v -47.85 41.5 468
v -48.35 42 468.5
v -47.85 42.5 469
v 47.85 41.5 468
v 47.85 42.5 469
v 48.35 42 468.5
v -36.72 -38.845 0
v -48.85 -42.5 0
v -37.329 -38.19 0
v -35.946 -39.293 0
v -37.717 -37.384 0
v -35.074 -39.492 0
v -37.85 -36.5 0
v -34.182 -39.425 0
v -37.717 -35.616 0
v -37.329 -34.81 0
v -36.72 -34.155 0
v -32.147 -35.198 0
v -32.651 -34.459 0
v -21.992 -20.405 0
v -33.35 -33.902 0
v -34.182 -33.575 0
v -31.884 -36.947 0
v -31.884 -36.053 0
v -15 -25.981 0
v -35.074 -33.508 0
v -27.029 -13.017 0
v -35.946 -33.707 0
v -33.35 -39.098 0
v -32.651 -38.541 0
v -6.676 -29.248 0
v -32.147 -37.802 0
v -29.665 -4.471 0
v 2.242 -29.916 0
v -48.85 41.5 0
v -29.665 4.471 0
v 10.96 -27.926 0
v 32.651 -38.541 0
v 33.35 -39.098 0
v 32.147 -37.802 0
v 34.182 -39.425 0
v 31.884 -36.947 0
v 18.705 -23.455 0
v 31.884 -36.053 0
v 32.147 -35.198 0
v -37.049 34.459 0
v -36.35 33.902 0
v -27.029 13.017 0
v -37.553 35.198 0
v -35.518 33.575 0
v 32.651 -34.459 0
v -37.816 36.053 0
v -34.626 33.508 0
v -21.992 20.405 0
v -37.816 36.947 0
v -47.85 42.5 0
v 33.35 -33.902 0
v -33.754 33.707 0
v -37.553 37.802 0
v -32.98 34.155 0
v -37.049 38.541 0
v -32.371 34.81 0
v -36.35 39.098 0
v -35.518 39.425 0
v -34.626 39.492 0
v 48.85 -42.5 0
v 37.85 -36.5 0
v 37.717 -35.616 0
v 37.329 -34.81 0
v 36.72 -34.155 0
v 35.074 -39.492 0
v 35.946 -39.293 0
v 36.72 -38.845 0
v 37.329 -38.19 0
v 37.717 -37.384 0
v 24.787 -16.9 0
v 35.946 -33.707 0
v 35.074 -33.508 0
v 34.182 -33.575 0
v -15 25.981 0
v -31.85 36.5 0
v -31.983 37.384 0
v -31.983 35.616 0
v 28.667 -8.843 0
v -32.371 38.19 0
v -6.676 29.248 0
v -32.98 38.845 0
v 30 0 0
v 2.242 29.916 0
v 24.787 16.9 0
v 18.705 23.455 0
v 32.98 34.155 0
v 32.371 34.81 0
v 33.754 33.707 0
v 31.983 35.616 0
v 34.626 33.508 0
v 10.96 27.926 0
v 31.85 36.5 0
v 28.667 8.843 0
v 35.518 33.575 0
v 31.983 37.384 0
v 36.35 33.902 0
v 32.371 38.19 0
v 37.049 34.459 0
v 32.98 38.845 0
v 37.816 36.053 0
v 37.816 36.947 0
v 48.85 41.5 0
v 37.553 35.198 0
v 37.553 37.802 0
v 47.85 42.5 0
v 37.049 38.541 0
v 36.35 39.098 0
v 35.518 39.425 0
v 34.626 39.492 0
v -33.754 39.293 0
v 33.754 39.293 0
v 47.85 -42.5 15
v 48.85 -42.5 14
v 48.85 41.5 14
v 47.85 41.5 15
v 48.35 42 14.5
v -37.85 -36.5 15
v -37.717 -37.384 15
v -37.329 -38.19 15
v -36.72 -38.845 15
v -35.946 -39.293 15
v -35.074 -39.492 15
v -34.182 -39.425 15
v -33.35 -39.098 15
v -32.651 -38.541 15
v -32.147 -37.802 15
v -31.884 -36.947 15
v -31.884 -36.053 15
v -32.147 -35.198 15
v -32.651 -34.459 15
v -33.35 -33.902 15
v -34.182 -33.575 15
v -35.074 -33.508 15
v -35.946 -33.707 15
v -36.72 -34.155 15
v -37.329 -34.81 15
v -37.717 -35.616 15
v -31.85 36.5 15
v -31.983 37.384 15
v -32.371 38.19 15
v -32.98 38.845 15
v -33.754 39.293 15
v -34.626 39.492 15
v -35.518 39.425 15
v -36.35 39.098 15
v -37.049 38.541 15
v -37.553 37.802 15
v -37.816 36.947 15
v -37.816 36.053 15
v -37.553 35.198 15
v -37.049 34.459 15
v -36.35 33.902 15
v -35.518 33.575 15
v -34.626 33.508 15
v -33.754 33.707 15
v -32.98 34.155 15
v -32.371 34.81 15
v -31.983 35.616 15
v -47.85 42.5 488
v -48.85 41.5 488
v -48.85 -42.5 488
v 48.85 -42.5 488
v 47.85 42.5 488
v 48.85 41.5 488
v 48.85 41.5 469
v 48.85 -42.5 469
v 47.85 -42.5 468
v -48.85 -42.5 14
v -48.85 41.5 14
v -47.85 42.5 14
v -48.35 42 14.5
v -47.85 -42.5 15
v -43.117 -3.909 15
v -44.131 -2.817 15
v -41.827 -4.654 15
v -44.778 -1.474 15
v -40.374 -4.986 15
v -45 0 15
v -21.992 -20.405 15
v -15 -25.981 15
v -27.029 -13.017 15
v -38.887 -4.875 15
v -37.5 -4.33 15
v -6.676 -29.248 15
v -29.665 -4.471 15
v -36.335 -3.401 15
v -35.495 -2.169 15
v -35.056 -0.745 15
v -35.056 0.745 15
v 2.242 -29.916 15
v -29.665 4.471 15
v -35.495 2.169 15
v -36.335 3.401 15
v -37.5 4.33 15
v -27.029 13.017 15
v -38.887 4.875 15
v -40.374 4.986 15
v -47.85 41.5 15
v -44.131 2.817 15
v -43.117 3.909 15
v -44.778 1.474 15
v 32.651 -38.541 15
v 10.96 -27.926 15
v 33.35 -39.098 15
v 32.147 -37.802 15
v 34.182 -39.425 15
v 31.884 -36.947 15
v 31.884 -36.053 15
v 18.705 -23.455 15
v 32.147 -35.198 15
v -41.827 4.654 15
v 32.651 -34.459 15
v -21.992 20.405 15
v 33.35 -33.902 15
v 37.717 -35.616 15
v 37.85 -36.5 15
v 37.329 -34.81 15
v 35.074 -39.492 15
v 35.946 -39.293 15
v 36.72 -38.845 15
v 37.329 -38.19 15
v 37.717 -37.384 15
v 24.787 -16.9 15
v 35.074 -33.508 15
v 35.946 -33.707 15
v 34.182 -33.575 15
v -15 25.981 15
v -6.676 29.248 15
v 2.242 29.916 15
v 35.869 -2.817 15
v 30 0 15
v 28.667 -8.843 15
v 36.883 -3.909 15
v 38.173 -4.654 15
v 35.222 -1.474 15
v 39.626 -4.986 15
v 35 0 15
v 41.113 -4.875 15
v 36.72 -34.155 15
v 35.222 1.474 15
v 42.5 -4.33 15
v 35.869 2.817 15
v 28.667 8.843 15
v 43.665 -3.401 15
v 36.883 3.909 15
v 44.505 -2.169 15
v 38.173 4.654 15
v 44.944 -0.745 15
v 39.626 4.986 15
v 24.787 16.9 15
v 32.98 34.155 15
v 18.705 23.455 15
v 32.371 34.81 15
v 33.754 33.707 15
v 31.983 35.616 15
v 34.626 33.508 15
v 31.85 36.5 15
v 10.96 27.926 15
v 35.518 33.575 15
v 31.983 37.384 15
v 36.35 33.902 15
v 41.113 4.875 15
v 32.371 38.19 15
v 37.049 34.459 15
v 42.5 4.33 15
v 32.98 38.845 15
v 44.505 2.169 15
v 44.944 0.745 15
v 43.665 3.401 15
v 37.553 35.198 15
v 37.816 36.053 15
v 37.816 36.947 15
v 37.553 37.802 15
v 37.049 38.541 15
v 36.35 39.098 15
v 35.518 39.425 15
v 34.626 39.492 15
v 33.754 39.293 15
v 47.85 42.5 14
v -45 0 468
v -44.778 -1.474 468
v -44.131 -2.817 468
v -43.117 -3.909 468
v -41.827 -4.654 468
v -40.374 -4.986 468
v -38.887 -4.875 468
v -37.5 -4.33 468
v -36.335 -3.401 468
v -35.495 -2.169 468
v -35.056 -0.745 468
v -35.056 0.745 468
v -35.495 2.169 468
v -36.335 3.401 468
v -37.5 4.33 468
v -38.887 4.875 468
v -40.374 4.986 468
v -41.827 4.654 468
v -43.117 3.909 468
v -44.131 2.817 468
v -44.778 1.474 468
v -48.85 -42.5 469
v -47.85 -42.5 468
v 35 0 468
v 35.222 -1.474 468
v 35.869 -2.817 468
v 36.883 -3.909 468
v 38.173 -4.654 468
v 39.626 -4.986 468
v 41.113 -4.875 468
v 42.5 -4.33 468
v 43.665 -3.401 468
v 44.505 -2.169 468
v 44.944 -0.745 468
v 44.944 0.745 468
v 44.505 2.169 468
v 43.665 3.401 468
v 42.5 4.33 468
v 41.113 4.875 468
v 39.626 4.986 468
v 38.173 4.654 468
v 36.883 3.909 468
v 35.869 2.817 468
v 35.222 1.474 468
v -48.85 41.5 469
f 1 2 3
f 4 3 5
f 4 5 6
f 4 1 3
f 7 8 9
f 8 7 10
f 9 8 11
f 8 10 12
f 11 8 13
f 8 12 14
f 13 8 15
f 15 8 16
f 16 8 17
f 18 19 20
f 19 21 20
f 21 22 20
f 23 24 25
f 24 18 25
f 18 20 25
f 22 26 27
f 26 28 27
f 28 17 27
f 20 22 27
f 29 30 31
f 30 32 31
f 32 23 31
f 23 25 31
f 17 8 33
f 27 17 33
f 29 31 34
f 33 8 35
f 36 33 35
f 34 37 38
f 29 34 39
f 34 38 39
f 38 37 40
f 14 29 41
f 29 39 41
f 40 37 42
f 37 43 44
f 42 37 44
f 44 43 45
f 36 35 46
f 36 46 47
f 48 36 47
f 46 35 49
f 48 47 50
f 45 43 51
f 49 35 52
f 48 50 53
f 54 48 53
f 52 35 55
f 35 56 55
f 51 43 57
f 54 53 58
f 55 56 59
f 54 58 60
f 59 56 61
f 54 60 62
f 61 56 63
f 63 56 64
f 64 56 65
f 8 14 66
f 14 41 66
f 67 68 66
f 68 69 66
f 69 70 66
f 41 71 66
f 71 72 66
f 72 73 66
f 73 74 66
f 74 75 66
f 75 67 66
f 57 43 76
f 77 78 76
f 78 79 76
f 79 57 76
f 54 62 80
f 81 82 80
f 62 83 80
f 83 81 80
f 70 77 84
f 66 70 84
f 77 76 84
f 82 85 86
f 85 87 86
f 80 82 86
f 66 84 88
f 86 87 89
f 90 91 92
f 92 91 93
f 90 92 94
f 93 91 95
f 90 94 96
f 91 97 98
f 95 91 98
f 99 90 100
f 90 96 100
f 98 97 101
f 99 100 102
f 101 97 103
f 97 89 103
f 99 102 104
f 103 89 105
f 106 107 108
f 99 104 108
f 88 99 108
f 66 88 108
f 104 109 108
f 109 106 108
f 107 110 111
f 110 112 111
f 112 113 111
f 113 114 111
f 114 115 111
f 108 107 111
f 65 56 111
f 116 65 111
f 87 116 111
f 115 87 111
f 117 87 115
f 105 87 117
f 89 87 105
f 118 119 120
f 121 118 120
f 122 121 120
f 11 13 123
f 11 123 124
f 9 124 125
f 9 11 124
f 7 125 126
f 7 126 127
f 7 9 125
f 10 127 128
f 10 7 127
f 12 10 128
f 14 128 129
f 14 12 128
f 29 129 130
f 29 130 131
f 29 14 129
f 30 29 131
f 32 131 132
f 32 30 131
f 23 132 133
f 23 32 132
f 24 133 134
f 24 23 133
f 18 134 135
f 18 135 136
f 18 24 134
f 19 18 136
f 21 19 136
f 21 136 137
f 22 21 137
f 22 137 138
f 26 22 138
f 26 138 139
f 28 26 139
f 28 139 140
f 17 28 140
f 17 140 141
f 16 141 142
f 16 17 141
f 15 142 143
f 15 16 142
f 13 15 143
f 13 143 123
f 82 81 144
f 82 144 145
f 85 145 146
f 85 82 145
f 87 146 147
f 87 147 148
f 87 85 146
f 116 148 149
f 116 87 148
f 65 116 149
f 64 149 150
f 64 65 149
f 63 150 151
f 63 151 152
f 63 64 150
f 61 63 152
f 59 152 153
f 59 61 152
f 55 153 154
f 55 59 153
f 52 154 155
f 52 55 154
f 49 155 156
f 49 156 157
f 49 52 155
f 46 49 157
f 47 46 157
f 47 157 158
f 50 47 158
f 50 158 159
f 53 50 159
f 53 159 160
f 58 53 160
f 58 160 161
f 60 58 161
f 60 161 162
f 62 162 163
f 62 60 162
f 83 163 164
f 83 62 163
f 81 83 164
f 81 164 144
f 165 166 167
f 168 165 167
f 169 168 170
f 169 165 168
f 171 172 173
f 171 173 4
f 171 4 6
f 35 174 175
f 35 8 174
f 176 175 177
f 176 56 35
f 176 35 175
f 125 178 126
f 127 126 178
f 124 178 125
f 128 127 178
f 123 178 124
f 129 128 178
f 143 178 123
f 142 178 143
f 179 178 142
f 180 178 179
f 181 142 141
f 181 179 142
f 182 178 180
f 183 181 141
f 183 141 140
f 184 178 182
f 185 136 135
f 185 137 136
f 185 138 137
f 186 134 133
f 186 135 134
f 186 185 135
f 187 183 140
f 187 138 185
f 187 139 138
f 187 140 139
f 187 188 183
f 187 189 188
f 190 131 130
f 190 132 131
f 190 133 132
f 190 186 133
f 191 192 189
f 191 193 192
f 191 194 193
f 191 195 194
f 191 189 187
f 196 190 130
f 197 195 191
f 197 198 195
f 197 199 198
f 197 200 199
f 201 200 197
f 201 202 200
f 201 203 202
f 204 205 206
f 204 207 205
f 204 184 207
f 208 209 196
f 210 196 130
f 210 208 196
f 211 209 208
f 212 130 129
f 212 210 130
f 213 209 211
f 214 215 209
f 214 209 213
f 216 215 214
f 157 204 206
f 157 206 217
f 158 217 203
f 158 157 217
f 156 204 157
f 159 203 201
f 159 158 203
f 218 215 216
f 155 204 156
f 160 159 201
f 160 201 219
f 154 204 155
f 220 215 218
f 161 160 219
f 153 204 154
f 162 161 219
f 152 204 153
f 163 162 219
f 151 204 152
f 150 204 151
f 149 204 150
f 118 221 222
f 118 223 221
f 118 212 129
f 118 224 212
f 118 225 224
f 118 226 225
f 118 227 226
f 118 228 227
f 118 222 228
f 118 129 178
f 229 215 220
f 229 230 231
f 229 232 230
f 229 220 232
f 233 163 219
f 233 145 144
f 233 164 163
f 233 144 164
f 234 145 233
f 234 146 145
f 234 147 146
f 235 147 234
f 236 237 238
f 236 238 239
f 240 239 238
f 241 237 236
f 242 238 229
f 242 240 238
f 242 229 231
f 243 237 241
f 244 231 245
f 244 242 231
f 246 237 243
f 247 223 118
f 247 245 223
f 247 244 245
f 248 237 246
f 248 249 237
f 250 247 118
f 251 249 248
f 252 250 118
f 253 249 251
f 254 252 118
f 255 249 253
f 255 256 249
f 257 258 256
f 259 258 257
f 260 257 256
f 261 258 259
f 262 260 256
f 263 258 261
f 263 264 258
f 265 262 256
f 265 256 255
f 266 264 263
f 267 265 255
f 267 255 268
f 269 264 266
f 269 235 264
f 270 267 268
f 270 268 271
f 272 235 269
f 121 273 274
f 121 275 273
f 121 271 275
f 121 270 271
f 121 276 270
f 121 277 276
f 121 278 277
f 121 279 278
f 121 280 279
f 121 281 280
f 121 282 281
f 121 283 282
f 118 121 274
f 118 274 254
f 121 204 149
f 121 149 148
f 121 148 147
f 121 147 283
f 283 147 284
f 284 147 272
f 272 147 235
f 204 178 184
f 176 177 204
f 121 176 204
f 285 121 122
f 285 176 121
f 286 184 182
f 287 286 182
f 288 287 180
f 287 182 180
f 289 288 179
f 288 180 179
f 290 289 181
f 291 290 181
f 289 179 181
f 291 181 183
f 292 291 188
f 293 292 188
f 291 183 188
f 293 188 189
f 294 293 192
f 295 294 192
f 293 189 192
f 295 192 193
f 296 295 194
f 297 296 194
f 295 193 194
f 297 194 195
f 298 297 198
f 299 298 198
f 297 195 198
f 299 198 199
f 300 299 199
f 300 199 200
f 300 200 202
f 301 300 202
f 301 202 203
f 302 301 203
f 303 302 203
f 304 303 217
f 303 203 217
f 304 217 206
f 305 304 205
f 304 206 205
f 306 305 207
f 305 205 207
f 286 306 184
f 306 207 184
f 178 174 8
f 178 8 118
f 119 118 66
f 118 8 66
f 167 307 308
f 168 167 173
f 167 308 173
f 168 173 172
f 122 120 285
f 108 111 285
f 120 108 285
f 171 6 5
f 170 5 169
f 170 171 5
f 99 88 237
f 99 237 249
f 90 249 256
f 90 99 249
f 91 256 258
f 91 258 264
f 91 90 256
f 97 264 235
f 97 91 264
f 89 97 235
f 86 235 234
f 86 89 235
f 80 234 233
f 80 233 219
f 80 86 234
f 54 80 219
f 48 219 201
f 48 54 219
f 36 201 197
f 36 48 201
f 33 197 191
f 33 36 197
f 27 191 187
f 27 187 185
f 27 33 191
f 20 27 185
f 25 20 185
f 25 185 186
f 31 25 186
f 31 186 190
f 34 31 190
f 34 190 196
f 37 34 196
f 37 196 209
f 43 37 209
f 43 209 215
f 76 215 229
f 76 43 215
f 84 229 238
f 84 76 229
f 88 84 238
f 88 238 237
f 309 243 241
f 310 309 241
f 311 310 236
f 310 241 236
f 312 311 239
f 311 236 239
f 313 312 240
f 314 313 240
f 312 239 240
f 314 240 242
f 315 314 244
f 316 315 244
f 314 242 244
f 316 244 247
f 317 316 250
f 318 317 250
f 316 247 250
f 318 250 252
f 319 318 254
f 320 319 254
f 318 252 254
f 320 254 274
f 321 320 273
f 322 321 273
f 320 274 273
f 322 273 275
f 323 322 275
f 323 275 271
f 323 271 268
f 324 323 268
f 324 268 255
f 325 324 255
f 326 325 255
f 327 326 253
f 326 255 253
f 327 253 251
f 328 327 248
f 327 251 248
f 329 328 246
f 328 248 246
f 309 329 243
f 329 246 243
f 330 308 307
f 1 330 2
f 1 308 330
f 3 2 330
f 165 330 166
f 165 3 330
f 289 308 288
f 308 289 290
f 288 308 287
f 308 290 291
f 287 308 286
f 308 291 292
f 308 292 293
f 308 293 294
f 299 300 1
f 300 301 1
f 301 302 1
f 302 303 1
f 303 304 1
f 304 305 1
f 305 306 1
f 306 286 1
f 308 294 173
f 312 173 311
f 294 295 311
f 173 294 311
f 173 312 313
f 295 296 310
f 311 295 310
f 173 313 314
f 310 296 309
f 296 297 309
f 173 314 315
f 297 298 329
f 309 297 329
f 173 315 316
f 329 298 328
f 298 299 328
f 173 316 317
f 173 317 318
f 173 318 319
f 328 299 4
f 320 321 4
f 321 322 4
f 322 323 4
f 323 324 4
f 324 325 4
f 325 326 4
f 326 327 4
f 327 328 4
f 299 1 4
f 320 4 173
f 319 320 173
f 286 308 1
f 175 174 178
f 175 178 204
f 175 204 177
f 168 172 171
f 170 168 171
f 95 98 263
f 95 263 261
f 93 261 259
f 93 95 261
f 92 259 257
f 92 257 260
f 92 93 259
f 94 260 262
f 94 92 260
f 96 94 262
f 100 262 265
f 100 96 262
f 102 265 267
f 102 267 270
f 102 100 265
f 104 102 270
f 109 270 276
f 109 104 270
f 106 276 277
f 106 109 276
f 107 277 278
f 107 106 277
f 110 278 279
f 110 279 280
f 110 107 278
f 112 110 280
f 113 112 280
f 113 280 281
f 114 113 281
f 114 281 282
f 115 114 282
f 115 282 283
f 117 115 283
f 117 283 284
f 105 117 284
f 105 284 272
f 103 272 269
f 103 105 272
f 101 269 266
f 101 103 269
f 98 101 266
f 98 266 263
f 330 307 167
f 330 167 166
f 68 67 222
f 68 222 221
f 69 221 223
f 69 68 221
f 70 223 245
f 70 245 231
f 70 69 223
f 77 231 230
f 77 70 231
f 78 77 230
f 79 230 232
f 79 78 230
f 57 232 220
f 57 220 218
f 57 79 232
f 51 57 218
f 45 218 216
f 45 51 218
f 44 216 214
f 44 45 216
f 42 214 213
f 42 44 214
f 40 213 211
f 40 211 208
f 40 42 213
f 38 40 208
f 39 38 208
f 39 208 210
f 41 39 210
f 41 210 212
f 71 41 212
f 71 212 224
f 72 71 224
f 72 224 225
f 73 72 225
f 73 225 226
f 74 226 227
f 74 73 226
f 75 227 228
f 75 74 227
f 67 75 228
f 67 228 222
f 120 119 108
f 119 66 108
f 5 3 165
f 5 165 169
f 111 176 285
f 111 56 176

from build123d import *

# Parameters (mm, degrees)
CROQUIS1_W              = 97.7
CROQUIS1_H              = 85
CROQUIS1_R              = 3
CROQUIS1_R_2            = 30
SALIENTE_EXTRUIR1_DEPTH = 15
CROQUIS2_R              = 5
SALIENTE_EXTRUIR2_DEPTH = 453
SALIENTE_EXTRUIR3_START = 3
CROQUIS3_W              = 97.7
CROQUIS3_H              = 85
SALIENTE_EXTRUIR3_DEPTH = 20
CHAFL_N1_SIZE           = 1
CHAFL_N2_SIZE           = 1


with BuildPart() as part:
    # Croquis1 → Saliente-Extruir1 (new body)
    with BuildSketch(Plane.XY):
        Rectangle(CROQUIS1_W, CROQUIS1_H)
        with Locations((-34.85, 36.5)):
            Circle(CROQUIS1_R, mode=Mode.SUBTRACT)
        Circle(CROQUIS1_R_2, mode=Mode.SUBTRACT)
        with Locations(Location((34.85, 36.5, 0), (0, 0, 180))):
            Circle(CROQUIS1_R, mode=Mode.SUBTRACT)
        with Locations((34.85, -36.5)):
            Circle(CROQUIS1_R, mode=Mode.SUBTRACT)
        with Locations(Location((-34.85, -36.5, 0), (0, 0, 180))):
            Circle(CROQUIS1_R, mode=Mode.SUBTRACT)
    extrude(amount=SALIENTE_EXTRUIR1_DEPTH)

    # Croquis2 → Saliente-Extruir2 (add)
    with BuildSketch(Plane.XY.offset(15)):
        with Locations(Location((-40, 0, 0), (0, 0, 180))):
            Circle(CROQUIS2_R)
        with Locations(Location((40, 0, 0), (0, 0, 180))):
            Circle(CROQUIS2_R)
    extrude(amount=SALIENTE_EXTRUIR2_DEPTH)

    # Croquis3 → Saliente-Extruir3 (add)
    with BuildSketch(Plane.XY.offset(465).offset(SALIENTE_EXTRUIR3_START)):
        Rectangle(CROQUIS3_W, CROQUIS3_H)
    extrude(amount=SALIENTE_EXTRUIR3_DEPTH)

    # Chaflán1
    chafl_n1_edges = [part.edges().sort_by_distance(p)[0] for p in [
        (48.85, 0, 15),
        (0, 42.5, 15),
        (-48.85, 0, 468),
        (0, 42.5, 468),
        (48.85, 0, 468),
        (-48.85, 0, 15),
    ]]
    chamfer(chafl_n1_edges, length=CHAFL_N1_SIZE)

    # Chaflán2
    chafl_n2_edges = [part.edges().sort_by_distance(p)[0] for p in [
        (48.85, 42.5, 478.5),
        (-48.85, 42.5, 478.5),
        (-48.85, 42.5, 7),
        (48.85, 42.5, 7),
    ]]
    chamfer(chafl_n2_edges, length=CHAFL_N2_SIZE)


solid = part.part
